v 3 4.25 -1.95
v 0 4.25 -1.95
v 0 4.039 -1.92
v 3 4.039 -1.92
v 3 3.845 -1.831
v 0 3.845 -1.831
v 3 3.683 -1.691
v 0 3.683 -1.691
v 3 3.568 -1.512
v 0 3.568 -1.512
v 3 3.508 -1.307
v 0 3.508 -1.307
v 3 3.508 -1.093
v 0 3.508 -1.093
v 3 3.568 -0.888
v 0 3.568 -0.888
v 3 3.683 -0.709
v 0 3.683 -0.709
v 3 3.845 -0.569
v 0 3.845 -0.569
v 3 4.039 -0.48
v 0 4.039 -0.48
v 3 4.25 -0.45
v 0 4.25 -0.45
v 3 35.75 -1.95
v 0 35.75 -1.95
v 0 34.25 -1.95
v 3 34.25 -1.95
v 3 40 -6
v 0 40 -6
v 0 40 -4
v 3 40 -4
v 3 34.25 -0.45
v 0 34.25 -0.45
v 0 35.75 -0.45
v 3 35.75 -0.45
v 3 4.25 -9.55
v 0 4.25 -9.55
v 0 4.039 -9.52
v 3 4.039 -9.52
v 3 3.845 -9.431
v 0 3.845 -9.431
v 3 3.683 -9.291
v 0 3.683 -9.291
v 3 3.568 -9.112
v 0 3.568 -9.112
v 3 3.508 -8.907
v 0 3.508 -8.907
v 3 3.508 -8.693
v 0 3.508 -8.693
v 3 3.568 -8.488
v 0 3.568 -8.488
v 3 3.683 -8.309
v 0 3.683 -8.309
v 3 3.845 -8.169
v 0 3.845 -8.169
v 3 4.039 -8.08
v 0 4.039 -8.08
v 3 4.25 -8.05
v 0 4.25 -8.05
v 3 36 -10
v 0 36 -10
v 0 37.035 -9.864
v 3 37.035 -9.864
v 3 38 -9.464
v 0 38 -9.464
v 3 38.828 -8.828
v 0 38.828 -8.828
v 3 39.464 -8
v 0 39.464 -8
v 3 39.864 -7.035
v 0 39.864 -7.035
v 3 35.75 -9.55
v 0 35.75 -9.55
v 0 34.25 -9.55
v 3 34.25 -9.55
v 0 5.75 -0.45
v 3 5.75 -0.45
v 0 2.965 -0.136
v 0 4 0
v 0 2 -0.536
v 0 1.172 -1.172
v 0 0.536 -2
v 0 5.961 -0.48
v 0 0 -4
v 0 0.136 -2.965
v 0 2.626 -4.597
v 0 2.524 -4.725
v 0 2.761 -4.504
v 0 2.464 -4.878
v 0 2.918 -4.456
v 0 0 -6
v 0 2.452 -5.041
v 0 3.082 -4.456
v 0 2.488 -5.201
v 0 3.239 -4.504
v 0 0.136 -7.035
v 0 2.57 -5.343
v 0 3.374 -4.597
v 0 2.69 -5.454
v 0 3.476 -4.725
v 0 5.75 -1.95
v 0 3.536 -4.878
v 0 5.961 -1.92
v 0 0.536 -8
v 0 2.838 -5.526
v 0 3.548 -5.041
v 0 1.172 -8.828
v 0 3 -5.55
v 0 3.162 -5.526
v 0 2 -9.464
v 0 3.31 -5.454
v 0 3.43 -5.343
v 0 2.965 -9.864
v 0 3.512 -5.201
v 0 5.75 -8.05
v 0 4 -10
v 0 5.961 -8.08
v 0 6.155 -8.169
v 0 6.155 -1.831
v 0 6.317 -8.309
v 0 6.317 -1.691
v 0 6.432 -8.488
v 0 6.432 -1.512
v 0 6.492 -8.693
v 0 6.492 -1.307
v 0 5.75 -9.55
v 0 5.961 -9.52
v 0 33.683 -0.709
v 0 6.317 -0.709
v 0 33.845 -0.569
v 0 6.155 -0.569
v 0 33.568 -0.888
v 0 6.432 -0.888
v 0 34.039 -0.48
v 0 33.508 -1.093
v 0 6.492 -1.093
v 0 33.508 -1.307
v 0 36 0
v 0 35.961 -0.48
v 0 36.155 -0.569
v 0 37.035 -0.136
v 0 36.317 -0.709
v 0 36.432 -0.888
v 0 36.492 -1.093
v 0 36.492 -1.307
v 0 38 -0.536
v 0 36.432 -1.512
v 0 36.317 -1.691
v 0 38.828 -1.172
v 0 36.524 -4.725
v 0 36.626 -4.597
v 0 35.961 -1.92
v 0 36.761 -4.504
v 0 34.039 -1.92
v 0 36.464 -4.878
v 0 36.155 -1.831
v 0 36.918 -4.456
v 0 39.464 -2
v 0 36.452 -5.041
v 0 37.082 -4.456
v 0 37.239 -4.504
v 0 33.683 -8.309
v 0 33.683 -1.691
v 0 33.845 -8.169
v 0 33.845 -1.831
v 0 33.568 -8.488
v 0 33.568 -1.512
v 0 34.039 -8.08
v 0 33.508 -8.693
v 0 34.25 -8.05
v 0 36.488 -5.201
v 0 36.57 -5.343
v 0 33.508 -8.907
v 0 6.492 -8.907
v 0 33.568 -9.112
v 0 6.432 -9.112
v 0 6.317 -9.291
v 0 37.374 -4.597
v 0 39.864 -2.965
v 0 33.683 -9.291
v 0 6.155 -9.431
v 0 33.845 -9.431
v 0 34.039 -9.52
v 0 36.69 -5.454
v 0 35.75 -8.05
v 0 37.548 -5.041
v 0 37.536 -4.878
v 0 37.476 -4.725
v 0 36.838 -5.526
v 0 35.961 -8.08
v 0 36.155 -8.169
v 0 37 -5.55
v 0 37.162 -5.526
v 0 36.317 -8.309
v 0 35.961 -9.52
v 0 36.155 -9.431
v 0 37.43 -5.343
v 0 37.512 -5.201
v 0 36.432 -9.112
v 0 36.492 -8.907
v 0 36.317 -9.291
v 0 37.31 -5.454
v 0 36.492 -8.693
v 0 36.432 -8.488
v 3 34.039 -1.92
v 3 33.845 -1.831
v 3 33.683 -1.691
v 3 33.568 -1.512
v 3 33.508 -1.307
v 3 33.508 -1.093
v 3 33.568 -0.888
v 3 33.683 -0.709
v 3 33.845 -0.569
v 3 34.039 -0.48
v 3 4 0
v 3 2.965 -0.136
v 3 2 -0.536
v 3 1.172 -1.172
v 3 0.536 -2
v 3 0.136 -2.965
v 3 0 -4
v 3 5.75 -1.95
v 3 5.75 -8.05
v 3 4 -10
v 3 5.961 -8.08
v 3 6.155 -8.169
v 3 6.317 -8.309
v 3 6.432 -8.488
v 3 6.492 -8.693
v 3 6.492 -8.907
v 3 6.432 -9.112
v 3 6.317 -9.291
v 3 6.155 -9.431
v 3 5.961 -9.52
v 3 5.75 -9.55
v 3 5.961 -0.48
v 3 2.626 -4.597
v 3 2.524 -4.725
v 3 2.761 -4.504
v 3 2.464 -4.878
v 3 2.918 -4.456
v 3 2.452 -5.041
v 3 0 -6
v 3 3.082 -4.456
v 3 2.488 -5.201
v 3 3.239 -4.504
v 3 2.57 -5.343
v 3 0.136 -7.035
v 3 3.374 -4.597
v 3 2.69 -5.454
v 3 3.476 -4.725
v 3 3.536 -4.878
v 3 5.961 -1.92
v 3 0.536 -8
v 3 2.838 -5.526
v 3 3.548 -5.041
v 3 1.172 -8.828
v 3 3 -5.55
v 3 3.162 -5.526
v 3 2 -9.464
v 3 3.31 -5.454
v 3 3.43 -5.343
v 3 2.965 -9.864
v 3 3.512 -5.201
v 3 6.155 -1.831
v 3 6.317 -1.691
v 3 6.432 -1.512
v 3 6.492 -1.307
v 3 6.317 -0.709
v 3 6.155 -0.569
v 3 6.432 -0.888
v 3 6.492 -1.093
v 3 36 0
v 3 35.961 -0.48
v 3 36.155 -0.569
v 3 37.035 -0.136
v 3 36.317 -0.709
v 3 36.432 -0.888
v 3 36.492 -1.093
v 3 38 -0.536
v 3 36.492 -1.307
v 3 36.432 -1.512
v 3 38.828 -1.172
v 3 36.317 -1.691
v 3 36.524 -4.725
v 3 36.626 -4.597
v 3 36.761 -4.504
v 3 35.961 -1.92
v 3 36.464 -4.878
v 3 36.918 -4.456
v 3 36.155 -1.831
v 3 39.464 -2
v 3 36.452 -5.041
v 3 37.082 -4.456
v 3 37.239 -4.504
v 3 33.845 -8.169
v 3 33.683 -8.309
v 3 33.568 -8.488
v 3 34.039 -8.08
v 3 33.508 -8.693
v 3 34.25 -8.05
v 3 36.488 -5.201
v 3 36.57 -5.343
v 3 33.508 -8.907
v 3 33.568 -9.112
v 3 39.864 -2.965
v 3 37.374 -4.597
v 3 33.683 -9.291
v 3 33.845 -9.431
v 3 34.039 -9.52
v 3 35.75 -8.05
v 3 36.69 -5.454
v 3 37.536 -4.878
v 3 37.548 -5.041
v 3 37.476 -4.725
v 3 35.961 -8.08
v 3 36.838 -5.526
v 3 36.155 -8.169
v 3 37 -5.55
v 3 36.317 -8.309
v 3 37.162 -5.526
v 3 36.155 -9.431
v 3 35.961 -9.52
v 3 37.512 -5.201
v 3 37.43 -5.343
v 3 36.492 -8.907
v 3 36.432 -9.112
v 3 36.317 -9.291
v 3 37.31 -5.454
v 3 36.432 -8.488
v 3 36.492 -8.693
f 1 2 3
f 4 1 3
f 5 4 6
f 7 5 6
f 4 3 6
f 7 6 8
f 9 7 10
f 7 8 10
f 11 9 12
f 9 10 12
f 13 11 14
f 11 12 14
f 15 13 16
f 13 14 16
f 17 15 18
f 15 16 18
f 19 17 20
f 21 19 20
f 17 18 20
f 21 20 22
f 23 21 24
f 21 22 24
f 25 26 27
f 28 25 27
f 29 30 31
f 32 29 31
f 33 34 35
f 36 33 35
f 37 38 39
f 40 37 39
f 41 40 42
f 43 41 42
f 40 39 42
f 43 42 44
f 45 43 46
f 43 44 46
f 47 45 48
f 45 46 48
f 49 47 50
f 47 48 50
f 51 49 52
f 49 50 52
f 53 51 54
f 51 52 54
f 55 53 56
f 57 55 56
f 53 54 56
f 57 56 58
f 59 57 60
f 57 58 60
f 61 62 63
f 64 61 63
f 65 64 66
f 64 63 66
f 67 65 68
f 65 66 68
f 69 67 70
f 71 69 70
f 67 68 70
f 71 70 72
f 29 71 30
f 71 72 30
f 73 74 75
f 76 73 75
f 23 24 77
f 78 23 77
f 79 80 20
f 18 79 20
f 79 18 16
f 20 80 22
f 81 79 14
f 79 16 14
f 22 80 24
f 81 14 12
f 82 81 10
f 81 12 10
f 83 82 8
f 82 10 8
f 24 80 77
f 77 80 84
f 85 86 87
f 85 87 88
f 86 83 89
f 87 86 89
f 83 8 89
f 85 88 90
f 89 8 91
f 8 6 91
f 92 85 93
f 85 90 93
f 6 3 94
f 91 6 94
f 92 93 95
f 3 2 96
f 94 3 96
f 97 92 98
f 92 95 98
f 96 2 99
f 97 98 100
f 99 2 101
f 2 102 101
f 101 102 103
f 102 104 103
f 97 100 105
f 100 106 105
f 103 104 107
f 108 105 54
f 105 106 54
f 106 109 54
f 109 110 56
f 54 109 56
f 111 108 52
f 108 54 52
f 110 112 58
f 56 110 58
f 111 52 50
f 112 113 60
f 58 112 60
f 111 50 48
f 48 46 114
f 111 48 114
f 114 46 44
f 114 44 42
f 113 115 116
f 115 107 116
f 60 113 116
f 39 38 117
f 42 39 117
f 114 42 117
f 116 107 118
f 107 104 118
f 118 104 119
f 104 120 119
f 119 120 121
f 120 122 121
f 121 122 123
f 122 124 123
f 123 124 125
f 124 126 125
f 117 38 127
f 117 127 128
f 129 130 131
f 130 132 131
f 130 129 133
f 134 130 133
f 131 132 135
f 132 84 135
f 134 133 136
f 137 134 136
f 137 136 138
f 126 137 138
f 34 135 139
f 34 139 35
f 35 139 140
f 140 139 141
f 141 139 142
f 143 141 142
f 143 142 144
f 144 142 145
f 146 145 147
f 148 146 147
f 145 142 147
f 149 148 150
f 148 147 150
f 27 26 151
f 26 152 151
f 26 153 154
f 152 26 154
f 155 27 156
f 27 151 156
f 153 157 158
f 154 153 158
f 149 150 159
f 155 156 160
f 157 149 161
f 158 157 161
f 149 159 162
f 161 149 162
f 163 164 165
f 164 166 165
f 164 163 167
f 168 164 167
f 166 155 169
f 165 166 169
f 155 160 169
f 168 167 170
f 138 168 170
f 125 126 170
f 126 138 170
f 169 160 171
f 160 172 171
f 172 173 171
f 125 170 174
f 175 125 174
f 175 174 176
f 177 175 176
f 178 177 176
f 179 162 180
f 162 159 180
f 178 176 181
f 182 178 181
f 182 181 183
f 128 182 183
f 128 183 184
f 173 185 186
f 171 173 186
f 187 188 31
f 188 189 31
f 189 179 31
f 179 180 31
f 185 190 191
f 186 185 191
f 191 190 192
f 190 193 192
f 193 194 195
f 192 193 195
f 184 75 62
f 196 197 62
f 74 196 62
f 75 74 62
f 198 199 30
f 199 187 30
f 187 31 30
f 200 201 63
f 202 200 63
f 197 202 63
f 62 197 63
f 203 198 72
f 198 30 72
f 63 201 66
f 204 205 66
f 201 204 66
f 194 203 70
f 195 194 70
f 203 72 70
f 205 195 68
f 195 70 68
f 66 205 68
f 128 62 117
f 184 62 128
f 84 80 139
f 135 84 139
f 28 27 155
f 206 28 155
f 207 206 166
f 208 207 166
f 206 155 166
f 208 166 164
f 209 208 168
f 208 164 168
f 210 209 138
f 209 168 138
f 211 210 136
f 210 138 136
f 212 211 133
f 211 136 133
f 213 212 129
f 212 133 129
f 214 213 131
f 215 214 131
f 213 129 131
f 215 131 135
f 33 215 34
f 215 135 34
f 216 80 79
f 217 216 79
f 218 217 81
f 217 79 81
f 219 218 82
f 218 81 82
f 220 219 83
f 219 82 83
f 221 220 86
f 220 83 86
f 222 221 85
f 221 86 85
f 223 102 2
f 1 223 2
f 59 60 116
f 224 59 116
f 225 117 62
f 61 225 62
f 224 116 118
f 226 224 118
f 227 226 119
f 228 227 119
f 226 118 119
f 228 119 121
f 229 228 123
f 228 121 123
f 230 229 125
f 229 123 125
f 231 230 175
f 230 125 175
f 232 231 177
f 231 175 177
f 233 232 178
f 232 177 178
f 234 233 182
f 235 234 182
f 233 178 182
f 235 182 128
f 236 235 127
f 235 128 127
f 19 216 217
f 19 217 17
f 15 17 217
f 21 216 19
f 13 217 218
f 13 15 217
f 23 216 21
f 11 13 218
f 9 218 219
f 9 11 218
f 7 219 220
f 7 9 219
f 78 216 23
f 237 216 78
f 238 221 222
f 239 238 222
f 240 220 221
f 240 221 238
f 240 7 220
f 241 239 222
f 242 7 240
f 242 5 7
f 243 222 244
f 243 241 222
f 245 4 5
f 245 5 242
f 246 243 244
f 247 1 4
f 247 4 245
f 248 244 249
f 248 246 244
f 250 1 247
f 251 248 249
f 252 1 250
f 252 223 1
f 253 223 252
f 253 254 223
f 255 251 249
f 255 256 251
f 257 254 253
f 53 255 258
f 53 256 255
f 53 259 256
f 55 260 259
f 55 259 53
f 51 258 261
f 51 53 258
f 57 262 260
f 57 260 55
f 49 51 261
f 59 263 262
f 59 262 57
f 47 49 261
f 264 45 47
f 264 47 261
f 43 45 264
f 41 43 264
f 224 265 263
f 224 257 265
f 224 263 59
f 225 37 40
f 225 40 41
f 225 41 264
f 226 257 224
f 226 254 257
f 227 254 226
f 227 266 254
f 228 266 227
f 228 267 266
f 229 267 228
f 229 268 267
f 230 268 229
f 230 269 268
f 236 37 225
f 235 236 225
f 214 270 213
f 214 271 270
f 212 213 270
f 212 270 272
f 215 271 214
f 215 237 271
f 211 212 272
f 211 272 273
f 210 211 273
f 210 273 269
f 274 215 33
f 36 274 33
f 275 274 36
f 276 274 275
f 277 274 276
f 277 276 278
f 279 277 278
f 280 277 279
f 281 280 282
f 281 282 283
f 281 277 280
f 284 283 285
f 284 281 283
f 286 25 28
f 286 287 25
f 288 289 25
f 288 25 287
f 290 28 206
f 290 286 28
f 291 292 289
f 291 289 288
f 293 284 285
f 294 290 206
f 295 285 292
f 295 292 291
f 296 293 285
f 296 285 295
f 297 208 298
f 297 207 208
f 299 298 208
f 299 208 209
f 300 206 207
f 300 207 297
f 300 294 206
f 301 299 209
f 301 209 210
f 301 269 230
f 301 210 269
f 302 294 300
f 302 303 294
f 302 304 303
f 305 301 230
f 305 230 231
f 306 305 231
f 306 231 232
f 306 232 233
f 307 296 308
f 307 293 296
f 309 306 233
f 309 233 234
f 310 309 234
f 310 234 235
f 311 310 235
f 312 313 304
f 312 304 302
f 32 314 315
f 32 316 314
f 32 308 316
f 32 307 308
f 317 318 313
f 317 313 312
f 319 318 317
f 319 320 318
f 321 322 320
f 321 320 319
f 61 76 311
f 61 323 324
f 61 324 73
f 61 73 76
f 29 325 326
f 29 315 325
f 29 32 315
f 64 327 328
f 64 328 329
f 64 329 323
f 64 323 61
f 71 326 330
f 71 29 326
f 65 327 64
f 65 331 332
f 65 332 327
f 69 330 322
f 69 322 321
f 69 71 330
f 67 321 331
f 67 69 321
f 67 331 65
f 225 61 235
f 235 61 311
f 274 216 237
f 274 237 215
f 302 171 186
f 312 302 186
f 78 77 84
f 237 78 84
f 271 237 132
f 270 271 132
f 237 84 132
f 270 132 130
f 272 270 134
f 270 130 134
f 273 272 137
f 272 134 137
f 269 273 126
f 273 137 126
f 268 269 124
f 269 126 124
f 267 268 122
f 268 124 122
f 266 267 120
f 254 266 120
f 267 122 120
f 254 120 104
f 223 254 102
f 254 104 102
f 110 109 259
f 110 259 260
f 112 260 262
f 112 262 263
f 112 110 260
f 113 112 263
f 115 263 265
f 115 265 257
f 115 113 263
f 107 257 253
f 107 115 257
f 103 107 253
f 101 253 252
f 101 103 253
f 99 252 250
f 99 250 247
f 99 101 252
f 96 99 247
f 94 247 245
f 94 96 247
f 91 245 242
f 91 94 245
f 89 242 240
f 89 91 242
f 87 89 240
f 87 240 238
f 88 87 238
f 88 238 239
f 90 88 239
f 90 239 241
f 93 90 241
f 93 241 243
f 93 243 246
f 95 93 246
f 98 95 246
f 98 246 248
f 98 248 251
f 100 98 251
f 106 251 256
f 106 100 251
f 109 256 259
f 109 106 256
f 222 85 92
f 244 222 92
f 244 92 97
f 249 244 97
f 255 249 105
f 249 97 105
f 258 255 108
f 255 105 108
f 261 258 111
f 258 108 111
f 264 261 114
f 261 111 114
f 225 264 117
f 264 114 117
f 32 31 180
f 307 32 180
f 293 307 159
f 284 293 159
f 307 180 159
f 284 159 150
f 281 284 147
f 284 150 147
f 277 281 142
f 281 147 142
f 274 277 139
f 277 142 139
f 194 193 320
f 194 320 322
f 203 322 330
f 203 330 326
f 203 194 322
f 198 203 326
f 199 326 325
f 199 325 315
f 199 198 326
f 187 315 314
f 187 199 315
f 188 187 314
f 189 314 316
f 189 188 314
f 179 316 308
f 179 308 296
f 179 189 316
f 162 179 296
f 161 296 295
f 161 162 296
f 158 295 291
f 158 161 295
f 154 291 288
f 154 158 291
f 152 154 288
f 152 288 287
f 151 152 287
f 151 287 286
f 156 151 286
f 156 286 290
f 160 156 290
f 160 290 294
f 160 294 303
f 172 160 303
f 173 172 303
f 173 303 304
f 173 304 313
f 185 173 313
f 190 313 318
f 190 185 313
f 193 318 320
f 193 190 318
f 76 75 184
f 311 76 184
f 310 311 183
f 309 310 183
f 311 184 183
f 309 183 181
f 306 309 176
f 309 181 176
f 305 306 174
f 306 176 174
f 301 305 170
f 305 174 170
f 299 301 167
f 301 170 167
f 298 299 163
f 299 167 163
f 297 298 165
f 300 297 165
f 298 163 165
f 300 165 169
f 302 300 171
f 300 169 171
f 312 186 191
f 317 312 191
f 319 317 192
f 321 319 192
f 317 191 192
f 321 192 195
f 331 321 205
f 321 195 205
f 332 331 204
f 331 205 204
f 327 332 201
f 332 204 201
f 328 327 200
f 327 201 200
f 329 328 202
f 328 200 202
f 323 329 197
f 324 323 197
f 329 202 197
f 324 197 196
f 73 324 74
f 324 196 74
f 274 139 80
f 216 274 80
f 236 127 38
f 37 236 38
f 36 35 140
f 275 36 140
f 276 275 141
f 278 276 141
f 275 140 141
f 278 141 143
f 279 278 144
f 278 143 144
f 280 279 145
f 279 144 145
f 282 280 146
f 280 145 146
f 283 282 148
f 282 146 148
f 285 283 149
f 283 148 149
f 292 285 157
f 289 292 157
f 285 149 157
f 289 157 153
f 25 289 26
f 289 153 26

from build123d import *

# Parameters (mm, degrees)
SKETCH_1_R      = 0.55
EXTRUDE_1_DEPTH = 3


with BuildPart() as part:
    # Эскиз1 → Бобышка-Вытянуть1 (new body)
    with BuildSketch(Plane(origin=(0, 0, 0), x_dir=(0, 0, -1), z_dir=(1, 0, 0))):
        with BuildLine():
            Line((4, 0), (6, 0))
            ThreePointArc((6, 0), (8.828427125, 1.171572875), (10, 4))
            Line((10, 4), (10, 36))
            ThreePointArc((10, 36), (8.828427125, 38.828427125), (6, 40))
            Line((6, 40), (4, 40))
            ThreePointArc((4, 40), (1.171572875, 38.828427125), (0, 36))
            Line((0, 36), (0, 4))
            ThreePointArc((0, 4), (1.171572875, 1.171572875), (4, 0))
        make_face()
        with Locations((5, 3)):
            Circle(SKETCH_1_R, mode=Mode.SUBTRACT)
        with Locations((5, 37)):
            Circle(SKETCH_1_R, mode=Mode.SUBTRACT)
        with BuildLine():
            Line((1.95, 35.75), (1.95, 34.25))
            ThreePointArc((1.95, 34.25), (1.2, 33.5), (0.45, 34.25))
            Line((0.45, 34.25), (0.45, 35.75))
            ThreePointArc((0.45, 35.75), (1.2, 36.5), (1.95, 35.75))
        make_face(mode=Mode.SUBTRACT)
        with BuildLine():
            Line((0.45, 4.25), (0.45, 5.75))
            ThreePointArc((0.45, 5.75), (1.2, 6.5), (1.95, 5.75))
            Line((1.95, 5.75), (1.95, 4.25))
            ThreePointArc((1.95, 4.25), (1.2, 3.5), (0.45, 4.25))
        make_face(mode=Mode.SUBTRACT)
        with BuildLine():
            Line((8.05, 4.25), (8.05, 5.75))
            ThreePointArc((8.05, 5.75), (8.8, 6.5), (9.55, 5.75))
            Line((9.55, 5.75), (9.55, 4.25))
            ThreePointArc((9.55, 4.25), (8.8, 3.5), (8.05, 4.25))
        make_face(mode=Mode.SUBTRACT)
        with BuildLine():
            Line((8.05, 34.25), (8.05, 35.75))
            ThreePointArc((8.05, 35.75), (8.8, 36.5), (9.55, 35.75))
            Line((9.55, 35.75), (9.55, 34.25))
            ThreePointArc((9.55, 34.25), (8.8, 33.5), (8.05, 34.25))
        make_face(mode=Mode.SUBTRACT)
    extrude(amount=EXTRUDE_1_DEPTH)


solid = part.part
